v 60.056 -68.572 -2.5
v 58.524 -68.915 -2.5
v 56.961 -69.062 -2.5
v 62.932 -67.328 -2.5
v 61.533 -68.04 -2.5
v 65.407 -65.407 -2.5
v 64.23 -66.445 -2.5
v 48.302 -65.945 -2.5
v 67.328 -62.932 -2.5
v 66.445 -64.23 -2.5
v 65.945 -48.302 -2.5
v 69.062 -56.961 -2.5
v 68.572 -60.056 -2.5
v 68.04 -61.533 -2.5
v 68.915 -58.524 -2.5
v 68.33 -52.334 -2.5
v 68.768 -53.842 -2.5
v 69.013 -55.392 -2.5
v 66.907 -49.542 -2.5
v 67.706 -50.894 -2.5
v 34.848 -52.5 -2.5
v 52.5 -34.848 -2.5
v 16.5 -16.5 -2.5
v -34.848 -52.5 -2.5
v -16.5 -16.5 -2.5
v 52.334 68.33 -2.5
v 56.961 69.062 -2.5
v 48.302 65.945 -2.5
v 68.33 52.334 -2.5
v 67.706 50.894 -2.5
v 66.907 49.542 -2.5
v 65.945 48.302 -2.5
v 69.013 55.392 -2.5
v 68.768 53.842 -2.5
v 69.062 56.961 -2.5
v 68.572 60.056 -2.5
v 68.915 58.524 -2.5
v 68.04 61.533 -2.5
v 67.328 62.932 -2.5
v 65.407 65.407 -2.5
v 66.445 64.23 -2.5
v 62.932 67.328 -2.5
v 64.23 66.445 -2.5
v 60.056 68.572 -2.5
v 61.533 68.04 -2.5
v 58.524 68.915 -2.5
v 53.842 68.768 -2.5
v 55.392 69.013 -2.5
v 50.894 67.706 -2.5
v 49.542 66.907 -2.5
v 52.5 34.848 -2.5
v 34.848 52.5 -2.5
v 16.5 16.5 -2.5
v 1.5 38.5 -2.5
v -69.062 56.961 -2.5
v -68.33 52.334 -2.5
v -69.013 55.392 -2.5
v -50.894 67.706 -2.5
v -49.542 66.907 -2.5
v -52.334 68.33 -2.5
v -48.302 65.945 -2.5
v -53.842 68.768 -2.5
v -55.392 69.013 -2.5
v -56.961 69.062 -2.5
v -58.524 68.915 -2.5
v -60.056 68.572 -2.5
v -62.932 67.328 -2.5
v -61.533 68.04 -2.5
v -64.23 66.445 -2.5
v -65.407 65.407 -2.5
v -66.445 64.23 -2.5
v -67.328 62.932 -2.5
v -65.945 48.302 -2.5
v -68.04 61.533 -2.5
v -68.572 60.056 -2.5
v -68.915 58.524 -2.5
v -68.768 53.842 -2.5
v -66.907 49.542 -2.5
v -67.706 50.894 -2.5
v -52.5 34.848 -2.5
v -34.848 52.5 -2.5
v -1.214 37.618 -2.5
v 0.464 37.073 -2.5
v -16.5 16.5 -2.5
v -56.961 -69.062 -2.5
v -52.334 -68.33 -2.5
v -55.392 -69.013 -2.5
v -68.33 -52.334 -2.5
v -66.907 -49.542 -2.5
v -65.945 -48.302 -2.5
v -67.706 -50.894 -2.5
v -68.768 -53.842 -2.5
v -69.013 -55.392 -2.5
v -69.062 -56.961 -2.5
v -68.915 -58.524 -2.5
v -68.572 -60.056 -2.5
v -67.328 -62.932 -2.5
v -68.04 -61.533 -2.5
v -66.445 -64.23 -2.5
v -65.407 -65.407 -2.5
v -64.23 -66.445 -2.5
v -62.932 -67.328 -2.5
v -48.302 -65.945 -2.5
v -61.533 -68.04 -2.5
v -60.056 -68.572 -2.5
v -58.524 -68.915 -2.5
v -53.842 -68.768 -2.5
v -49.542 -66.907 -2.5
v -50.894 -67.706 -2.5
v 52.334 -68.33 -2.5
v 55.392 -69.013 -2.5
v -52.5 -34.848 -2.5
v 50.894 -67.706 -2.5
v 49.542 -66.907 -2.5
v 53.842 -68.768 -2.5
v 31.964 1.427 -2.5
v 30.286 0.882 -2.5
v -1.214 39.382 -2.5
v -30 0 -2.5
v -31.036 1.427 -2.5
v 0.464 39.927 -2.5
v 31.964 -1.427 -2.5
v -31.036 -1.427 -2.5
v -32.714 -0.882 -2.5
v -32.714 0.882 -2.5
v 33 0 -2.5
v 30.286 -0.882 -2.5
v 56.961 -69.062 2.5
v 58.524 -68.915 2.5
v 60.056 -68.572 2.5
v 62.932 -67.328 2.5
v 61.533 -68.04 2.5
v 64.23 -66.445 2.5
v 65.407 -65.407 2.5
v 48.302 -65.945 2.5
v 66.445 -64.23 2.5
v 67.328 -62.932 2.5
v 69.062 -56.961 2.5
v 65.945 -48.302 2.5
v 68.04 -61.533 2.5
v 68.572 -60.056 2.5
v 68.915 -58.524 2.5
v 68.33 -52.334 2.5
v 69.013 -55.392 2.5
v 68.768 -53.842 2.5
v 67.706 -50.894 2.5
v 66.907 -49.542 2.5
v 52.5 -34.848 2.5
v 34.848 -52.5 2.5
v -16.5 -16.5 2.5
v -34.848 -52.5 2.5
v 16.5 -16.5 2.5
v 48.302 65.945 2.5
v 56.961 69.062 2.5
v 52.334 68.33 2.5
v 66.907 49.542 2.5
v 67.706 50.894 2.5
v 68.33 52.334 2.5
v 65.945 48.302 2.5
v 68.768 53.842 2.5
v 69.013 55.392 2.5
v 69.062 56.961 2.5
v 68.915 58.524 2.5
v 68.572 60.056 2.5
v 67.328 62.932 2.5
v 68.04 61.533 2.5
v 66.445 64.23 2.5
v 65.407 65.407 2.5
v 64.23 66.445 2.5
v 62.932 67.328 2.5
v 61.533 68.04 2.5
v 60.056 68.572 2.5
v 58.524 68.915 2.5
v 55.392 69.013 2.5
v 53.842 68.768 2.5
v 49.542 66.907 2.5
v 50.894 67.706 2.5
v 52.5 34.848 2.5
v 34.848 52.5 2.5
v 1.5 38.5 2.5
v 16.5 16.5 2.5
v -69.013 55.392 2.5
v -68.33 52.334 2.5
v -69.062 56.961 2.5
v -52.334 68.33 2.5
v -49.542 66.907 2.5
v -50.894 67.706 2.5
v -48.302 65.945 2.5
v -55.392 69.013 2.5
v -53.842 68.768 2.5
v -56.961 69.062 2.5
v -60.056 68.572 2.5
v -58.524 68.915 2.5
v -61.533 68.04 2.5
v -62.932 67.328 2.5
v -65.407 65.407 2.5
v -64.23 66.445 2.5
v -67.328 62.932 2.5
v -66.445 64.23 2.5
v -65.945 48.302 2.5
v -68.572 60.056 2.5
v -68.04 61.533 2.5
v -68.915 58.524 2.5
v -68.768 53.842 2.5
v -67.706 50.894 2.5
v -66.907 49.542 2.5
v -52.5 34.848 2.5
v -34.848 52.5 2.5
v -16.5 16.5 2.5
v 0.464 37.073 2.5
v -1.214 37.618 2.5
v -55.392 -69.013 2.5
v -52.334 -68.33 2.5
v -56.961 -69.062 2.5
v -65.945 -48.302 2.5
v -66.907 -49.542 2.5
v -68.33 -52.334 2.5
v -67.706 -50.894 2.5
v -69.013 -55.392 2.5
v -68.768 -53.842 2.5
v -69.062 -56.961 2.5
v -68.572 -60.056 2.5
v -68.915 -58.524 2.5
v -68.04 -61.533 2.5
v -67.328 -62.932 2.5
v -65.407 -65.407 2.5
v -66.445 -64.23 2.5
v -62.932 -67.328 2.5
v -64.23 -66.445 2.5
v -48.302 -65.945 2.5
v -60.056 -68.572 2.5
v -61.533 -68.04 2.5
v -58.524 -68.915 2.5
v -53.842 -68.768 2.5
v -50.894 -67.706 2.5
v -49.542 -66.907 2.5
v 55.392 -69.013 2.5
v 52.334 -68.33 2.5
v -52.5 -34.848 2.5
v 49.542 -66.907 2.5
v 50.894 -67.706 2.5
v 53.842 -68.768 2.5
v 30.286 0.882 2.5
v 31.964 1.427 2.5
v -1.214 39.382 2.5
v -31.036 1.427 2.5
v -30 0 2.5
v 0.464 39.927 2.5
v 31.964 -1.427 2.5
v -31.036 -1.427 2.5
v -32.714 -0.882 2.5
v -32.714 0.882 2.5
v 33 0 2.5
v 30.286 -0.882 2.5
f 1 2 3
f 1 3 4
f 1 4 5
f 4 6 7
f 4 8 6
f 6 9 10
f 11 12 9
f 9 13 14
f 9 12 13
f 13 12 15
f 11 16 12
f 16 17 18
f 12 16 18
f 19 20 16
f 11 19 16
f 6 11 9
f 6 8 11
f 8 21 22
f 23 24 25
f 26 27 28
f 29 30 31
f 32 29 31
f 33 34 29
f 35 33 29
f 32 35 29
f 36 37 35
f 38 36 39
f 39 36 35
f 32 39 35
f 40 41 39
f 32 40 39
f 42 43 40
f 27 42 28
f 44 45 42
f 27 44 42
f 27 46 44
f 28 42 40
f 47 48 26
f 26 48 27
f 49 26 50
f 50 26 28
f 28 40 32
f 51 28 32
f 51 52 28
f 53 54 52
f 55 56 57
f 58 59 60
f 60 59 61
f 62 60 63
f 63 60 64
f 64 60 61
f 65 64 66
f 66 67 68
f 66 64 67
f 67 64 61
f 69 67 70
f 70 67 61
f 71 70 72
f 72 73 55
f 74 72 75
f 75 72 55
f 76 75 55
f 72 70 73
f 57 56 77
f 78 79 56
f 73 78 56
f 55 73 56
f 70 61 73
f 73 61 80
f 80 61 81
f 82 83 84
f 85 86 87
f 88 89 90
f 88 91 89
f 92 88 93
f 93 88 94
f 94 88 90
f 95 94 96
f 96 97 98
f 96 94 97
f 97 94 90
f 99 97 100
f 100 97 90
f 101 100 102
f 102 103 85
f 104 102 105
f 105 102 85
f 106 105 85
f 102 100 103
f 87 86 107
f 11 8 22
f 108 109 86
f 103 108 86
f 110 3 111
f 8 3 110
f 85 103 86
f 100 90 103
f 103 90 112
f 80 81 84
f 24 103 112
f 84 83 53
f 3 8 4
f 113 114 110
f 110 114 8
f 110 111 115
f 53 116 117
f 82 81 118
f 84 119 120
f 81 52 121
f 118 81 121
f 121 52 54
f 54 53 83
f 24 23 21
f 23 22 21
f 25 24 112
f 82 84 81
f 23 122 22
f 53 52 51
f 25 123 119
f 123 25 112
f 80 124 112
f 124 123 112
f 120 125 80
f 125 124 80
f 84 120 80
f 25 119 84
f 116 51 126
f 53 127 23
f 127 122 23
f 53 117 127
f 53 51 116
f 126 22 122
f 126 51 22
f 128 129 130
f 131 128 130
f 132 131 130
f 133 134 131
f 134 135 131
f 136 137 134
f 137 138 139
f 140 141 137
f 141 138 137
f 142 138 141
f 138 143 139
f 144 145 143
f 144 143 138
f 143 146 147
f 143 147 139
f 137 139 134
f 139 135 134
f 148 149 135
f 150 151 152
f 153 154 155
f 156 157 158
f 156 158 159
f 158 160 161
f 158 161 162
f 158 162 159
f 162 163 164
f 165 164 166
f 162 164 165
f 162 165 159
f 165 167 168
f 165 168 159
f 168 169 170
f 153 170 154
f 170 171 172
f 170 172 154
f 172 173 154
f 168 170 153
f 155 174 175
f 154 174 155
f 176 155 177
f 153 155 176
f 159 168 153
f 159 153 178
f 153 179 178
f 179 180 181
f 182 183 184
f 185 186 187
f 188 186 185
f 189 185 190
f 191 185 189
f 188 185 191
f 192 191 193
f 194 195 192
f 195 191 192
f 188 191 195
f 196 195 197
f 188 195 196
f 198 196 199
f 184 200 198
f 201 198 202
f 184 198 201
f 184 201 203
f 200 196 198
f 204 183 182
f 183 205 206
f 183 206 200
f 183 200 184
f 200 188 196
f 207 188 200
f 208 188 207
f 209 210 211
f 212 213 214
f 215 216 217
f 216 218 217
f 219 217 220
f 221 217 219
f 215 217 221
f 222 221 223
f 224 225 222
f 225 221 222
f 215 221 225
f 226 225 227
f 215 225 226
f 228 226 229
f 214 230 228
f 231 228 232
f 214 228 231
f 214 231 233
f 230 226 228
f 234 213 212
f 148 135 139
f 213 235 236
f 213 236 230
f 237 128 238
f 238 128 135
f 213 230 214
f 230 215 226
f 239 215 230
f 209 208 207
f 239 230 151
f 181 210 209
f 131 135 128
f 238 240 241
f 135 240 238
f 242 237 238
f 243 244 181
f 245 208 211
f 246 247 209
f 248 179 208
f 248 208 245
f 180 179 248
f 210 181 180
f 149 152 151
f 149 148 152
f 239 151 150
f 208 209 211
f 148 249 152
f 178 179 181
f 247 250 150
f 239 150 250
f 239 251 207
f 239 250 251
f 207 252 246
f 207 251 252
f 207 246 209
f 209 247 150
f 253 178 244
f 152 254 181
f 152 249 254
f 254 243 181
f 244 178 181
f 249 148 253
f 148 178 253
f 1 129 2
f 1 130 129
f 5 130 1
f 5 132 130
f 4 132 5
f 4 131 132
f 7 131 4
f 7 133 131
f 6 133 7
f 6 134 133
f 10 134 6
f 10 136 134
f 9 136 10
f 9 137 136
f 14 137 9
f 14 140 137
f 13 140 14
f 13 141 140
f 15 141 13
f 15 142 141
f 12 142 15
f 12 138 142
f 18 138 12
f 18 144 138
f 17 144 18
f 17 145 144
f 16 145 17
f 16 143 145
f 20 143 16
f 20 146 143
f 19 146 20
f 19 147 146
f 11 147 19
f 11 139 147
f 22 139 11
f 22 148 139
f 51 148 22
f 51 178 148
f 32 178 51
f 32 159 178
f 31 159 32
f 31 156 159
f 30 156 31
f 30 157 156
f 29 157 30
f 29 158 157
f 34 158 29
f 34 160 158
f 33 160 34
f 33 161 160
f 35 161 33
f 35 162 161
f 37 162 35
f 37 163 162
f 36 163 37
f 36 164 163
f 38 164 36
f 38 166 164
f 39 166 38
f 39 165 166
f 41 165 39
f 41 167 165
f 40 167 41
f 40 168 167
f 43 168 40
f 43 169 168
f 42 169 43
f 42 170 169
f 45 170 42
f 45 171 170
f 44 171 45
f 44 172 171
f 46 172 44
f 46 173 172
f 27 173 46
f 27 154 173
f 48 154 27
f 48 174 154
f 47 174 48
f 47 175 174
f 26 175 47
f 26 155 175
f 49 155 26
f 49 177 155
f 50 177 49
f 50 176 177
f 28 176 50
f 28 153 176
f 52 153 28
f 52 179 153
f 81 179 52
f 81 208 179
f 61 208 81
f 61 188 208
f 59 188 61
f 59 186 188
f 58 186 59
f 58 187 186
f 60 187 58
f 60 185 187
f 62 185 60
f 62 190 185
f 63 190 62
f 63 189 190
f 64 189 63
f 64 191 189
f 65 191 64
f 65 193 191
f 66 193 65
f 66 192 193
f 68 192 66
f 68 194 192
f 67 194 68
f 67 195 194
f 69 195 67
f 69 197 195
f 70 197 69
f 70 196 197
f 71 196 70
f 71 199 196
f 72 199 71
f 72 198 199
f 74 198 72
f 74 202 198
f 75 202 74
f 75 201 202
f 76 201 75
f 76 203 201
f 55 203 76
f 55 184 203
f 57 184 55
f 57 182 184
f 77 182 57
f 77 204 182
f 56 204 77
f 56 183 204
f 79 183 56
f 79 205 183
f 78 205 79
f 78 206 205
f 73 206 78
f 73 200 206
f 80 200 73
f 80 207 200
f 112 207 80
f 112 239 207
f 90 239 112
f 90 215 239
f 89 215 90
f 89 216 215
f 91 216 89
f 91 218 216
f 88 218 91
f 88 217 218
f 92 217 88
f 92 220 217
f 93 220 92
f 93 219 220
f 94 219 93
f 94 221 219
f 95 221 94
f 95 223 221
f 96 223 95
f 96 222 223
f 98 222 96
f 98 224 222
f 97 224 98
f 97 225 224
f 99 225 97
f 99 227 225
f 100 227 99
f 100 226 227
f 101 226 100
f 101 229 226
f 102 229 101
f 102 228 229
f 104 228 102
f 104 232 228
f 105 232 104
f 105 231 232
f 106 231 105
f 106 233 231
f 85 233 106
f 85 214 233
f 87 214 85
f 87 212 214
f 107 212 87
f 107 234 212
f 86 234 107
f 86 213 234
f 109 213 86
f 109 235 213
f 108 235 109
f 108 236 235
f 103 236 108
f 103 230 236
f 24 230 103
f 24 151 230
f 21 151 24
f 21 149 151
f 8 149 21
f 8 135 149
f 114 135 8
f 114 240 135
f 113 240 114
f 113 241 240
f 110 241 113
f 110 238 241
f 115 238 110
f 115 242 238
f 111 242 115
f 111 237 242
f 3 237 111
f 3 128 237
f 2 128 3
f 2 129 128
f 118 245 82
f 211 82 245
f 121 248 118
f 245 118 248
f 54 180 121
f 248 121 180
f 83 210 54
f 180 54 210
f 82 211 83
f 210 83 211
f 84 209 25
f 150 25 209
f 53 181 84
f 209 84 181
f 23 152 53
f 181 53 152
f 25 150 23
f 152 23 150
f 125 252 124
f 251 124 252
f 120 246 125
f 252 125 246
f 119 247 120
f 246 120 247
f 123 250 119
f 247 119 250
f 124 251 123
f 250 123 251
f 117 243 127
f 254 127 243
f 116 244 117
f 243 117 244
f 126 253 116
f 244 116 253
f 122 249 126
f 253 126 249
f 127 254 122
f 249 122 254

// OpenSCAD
// file: 2d_foot.scad
// VoR-12 - 2D foot

// Copyright (c) 2015 Jérémie DECOCK (www.jdhp.org)

// Base unit: mm

module 2d_foot() {
    inner_square_size = 33;
    outer_square_size = 105;
    screw_hole_diameter = 3;

    difference() {
        union() {
            square(outer_square_size, center=true);
            rotate(45) 2d_toe();
            rotate(135) 2d_toe();
            rotate(-45) 2d_toe();
            rotate(-135) 2d_toe();
        }

        union() {
            square(inner_square_size, center=true);
            translate([-31.5,    0]) circle(d=screw_hole_diameter);
            translate([ 31.5,    0]) circle(d=screw_hole_diameter);
            translate([    0, 38.5]) circle(d=screw_hole_diameter);
        }
    }
}

module 2d_toe() {
    $fn=50;

    toe_depth = 25;
    toe_length = 80;

    hull() {
        square(toe_depth, center=true);
        translate([toe_length, 0]) circle(d=toe_depth);
    }
}

// Uncomment the following line to test this module
2d_foot();
// main file
// A base board for the VoR-12 project
// This 3D OpenSCAD file can be used with a 3D printer

// The MIT License
//
// Copyright (c) 2015 Jeremie DECOCK (http://www.jdhp.org)
//
// Permission is hereby granted, free of charge, to any person obtaining a copy
// of this software and associated documentation files (the "Software"), to deal
// in the Software without restriction, including without limitation the rights
// to use, copy, modify, merge, publish, distribute, sublicense, and/or sell
// copies of the Software, and to permit persons to whom the Software is
// furnished to do so, subject to the following conditions:
//
// The above copyright notice and this permission notice shall be included in
// all copies or substantial portions of the Software.
//
// THE SOFTWARE IS PROVIDED "AS IS", WITHOUT WARRANTY OF ANY KIND, EXPRESS OR
// IMPLIED, INCLUDING BUT NOT LIMITED TO THE WARRANTIES OF MERCHANTABILITY,
// FITNESS FOR A PARTICULAR PURPOSE AND NONINFRINGEMENT. IN NO EVENT SHALL THE
// AUTHORS OR COPYRIGHT HOLDERS BE LIABLE FOR ANY CLAIM, DAMAGES OR OTHER
// LIABILITY, WHETHER IN AN ACTION OF CONTRACT, TORT OR OTHERWISE, ARISING FROM,
// OUT OF OR IN CONNECTION WITH THE SOFTWARE OR THE USE OR OTHER DEALINGS IN
// THE SOFTWARE.

// To export this file to the STL format:
//
//    openscad -o 3d_foot.stl 3d_foot.scad
// 
// Requirement: openscad
// Base unit: mm

use <2d_foot.scad>

module 3d_foot() {
    linear_extrude(height=5, center=true, convexity=10, twist=0) {
        2d_foot();
    }
}

3d_foot();
